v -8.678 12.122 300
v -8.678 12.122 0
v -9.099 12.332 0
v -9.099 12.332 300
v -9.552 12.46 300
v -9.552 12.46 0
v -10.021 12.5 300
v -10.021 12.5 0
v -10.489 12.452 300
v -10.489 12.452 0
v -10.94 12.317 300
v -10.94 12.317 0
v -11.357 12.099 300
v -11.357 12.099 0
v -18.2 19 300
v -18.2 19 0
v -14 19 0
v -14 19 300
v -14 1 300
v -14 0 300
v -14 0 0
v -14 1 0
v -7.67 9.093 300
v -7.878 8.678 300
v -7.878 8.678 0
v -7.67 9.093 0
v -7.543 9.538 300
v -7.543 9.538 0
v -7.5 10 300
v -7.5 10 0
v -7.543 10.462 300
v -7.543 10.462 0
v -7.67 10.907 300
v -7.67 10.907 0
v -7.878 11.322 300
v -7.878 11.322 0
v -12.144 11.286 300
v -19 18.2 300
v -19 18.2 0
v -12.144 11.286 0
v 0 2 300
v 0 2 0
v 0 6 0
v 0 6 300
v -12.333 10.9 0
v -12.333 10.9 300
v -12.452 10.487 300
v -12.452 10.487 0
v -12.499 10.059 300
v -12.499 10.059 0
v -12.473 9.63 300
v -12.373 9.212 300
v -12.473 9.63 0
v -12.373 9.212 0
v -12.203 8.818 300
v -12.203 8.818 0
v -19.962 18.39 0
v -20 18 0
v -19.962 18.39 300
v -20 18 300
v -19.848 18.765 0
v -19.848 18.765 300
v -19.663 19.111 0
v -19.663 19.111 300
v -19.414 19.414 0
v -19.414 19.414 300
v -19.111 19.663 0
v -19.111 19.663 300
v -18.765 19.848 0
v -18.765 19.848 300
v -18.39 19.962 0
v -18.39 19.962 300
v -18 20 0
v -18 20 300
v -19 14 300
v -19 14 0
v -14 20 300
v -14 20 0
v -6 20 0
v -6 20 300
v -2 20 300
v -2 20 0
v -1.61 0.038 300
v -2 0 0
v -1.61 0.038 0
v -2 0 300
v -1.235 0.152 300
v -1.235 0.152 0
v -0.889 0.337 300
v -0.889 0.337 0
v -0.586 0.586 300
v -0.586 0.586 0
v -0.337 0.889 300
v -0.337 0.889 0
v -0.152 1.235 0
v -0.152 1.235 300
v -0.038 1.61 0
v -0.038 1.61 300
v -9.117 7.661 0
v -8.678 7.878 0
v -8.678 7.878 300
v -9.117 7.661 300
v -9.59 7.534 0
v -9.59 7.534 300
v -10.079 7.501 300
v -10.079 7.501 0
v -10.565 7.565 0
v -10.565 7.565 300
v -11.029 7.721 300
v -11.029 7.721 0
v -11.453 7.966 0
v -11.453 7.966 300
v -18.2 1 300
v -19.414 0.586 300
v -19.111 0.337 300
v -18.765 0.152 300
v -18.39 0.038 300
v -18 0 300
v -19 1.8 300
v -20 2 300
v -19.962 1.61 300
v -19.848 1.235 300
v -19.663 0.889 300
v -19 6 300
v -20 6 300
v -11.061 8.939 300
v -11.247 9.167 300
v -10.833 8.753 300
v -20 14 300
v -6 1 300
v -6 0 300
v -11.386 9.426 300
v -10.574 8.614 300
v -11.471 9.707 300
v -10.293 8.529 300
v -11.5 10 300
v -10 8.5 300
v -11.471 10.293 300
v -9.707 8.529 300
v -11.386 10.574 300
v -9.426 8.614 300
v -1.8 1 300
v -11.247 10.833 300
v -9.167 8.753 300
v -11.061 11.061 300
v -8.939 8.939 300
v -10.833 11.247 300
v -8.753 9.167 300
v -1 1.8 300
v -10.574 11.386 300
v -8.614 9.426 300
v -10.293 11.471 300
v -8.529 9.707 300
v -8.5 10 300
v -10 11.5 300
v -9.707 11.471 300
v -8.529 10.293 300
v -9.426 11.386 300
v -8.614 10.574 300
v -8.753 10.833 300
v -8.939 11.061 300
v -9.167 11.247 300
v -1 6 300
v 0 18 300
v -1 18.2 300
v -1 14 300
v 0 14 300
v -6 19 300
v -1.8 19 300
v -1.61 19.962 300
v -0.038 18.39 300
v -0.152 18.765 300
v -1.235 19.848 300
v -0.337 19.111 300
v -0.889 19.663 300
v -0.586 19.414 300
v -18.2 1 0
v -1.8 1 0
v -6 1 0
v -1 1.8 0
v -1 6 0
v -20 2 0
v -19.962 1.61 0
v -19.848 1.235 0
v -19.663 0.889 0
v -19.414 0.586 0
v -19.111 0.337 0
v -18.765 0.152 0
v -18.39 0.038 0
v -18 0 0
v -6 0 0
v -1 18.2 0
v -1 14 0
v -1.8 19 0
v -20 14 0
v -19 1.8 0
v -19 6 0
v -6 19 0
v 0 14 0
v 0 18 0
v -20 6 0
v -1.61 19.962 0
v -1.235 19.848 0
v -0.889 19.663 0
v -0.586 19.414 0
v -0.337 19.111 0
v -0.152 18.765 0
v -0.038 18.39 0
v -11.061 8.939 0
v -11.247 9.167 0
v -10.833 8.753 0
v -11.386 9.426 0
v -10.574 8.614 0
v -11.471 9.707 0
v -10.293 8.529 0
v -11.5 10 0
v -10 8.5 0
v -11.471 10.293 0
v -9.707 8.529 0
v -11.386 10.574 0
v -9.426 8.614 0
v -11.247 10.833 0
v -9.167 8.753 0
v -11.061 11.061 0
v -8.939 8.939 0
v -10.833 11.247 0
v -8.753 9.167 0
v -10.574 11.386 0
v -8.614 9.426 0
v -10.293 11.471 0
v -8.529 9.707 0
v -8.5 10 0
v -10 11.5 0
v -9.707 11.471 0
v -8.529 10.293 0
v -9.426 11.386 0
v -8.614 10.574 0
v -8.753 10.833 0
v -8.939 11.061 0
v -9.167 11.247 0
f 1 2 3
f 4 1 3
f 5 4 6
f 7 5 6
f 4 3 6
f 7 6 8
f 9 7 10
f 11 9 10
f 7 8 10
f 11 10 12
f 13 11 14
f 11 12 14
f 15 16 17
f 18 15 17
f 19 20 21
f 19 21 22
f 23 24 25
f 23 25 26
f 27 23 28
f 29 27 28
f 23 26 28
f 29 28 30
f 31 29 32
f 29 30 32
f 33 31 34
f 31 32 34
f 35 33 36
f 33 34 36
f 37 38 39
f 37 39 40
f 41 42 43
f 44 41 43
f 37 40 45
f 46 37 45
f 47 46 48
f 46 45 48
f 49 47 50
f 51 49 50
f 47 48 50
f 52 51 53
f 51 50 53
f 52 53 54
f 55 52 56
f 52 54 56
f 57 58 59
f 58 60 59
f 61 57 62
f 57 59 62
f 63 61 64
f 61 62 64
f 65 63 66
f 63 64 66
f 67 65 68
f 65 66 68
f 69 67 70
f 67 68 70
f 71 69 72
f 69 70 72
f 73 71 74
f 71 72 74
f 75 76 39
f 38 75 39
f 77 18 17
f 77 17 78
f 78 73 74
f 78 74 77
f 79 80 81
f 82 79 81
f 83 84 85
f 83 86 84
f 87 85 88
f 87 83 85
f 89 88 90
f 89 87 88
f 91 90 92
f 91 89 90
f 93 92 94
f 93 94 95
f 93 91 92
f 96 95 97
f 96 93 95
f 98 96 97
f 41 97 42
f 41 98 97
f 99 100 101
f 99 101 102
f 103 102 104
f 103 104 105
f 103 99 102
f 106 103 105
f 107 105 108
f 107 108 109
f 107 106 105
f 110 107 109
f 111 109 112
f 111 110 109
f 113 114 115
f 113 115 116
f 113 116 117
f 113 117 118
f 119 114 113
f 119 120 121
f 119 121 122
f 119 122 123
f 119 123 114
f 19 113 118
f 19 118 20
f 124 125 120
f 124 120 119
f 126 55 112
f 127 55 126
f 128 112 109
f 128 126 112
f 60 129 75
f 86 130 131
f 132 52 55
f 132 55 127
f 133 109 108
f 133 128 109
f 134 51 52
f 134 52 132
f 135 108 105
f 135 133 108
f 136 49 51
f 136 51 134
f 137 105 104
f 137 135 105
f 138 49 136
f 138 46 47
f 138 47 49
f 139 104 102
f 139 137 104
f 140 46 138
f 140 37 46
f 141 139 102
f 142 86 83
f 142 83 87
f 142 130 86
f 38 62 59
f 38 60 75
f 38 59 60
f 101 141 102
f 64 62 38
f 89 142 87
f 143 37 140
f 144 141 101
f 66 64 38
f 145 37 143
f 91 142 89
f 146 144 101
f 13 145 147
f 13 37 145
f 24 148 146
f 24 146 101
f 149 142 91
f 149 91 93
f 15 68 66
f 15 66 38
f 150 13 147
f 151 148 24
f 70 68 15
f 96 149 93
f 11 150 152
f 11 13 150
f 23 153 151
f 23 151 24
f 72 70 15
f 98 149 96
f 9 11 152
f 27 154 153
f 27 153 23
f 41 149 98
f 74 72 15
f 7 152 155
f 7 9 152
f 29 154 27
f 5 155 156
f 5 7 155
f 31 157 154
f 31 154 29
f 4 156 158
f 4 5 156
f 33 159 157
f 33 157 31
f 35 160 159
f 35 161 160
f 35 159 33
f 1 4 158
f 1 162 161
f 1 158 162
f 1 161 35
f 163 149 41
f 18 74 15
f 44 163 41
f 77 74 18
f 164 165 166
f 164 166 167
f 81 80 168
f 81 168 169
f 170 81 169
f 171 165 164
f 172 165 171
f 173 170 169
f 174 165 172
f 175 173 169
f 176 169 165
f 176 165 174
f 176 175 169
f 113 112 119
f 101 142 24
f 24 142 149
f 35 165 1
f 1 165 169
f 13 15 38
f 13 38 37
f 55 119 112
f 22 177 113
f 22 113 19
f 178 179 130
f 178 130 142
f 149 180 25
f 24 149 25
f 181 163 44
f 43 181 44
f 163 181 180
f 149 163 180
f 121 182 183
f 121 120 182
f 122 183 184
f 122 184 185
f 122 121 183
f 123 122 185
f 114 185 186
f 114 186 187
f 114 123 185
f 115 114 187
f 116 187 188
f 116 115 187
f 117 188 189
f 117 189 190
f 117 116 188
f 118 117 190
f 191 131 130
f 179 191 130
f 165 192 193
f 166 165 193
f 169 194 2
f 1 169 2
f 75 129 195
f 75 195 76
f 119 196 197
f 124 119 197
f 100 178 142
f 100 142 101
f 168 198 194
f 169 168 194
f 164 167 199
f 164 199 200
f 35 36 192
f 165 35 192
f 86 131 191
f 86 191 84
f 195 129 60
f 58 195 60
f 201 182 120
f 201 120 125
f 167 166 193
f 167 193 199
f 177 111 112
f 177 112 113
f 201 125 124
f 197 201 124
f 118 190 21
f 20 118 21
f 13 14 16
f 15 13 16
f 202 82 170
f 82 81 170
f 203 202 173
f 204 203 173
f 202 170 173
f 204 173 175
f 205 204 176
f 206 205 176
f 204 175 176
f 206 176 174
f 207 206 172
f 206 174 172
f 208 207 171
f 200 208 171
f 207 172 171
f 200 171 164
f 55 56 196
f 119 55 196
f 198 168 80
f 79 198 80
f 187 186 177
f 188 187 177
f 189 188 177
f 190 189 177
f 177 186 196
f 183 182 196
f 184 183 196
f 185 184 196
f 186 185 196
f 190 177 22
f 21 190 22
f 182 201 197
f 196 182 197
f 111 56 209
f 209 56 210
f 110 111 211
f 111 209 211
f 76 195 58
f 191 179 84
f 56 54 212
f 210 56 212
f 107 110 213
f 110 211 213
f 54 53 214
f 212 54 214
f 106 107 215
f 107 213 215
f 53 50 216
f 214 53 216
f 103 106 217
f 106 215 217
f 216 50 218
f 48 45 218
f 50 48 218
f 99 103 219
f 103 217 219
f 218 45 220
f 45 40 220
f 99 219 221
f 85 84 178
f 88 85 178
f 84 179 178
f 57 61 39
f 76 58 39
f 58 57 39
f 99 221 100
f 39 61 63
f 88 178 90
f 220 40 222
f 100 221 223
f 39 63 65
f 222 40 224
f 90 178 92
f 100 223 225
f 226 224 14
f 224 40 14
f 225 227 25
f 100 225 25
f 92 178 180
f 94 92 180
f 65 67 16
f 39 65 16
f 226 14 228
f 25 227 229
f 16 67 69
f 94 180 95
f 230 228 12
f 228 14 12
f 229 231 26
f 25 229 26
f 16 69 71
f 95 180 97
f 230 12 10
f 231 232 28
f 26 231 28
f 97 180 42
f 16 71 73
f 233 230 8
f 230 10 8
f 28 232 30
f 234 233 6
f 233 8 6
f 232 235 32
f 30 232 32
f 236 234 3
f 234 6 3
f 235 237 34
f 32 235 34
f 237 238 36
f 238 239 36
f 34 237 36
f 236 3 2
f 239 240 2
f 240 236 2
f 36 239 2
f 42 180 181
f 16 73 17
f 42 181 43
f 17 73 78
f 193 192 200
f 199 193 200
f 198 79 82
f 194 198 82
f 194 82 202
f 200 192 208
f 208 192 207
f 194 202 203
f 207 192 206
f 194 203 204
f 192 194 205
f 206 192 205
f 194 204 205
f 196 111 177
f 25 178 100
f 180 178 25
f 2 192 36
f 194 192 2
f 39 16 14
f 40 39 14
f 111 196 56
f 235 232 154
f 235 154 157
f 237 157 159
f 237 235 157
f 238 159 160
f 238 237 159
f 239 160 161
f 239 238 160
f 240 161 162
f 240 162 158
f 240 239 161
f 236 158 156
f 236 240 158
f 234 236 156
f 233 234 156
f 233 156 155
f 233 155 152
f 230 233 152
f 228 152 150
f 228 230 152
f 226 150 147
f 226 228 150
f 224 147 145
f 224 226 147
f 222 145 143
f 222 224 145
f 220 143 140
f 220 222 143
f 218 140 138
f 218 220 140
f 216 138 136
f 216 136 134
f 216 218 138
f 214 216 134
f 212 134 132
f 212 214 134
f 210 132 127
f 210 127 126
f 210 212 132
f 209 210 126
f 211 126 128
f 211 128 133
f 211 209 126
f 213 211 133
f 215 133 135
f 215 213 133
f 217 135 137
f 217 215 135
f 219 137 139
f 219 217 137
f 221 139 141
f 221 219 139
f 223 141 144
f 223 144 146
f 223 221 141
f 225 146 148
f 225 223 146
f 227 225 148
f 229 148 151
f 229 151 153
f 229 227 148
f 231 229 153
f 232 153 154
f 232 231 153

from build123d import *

# Parameters (mm, degrees)
ESQUISSE1_W             = 20
ESQUISSE1_H             = 20
ESQUISSE1_R             = 1.5
BOSS_EXTRU_1_DEPTH      = 300
CONG_1_R                = 2
ESQUISSE2_W             = 8
ESQUISSE2_H             = 1
ESQUISSE2_W_2           = 1
ESQUISSE2_H_2           = 8
ENL_V_MAT_EXTRU_1_DEPTH = 302.330383466


with BuildPart() as part:
    # Esquisse1 → Boss.-Extru.1 (new body)
    with BuildSketch(Plane.XY):
        with Locations((-10, 10)):
            Rectangle(ESQUISSE1_W, ESQUISSE1_H)
        with Locations((-10, 10)):
            Circle(ESQUISSE1_R, mode=Mode.SUBTRACT)
        with BuildLine():
            Line((-19, 18.2), (-12.144004756, 11.285785211))
            ThreePointArc((-12.144004756, 11.285785211), (-12.499292367, 10.059478285), (-12.20274135, 8.817658871))
            Line((-12.20274135, 8.817658871), (-19, 1.8))
            Line((-19, 1.8), (-19, 18.2))
        make_face(mode=Mode.SUBTRACT)
        with BuildLine():
            Line((-18.2, 1), (-1.8, 1))
            Line((-1.8, 1), (-8.678082464, 7.878082464))
            ThreePointArc((-8.678082464, 7.878082464), (-10.078866736, 7.501244302), (-11.453098741, 7.965668648))
            Line((-11.453098741, 7.965668648), (-18.2, 1))
        make_face(mode=Mode.SUBTRACT)
        with BuildLine():
            Line((-1, 18.2), (-1, 1.8))
            Line((-1, 1.8), (-7.878082464, 8.678082464))
            ThreePointArc((-7.878082464, 8.678082464), (-7.5, 10), (-7.878082464, 11.321917536))
            Line((-7.878082464, 11.321917536), (-1, 18.2))
        make_face(mode=Mode.SUBTRACT)
        with BuildLine():
            Line((-11.357461746, 12.099356475), (-18.2, 19))
            Line((-18.2, 19), (-1.8, 19))
            Line((-1.8, 19), (-8.678082464, 12.121917536))
            ThreePointArc((-8.678082464, 12.121917536), (-10.021049895, 12.499911379), (-11.357461746, 12.099356475))
        make_face(mode=Mode.SUBTRACT)
    extrude(amount=BOSS_EXTRU_1_DEPTH)

    # Congé1
    cong_1_edges = [part.edges().sort_by_distance(p)[0] for p in [
        (0, 0, 150),
        (-20, 0, 150),
        (-20, 20, 150),
        (0, 20, 150),
    ]]
    fillet(cong_1_edges, radius=CONG_1_R)

    # Esquisse2 → Enlèv. mat.-Extru.1 (cut, through all)
    with BuildSketch(Plane.XY.offset(300)):
        with Locations((-10, 19.5)):
            Rectangle(ESQUISSE2_W, ESQUISSE2_H)
        with Locations((-19.5, 10)):
            Rectangle(ESQUISSE2_W_2, ESQUISSE2_H_2)
        with Locations((-10, 0.5)):
            Rectangle(ESQUISSE2_W, ESQUISSE2_H)
        with Locations((-0.5, 10)):
            Rectangle(ESQUISSE2_W_2, ESQUISSE2_H_2)
    extrude(amount=-ENL_V_MAT_EXTRU_1_DEPTH, mode=Mode.SUBTRACT)


solid = part.part
